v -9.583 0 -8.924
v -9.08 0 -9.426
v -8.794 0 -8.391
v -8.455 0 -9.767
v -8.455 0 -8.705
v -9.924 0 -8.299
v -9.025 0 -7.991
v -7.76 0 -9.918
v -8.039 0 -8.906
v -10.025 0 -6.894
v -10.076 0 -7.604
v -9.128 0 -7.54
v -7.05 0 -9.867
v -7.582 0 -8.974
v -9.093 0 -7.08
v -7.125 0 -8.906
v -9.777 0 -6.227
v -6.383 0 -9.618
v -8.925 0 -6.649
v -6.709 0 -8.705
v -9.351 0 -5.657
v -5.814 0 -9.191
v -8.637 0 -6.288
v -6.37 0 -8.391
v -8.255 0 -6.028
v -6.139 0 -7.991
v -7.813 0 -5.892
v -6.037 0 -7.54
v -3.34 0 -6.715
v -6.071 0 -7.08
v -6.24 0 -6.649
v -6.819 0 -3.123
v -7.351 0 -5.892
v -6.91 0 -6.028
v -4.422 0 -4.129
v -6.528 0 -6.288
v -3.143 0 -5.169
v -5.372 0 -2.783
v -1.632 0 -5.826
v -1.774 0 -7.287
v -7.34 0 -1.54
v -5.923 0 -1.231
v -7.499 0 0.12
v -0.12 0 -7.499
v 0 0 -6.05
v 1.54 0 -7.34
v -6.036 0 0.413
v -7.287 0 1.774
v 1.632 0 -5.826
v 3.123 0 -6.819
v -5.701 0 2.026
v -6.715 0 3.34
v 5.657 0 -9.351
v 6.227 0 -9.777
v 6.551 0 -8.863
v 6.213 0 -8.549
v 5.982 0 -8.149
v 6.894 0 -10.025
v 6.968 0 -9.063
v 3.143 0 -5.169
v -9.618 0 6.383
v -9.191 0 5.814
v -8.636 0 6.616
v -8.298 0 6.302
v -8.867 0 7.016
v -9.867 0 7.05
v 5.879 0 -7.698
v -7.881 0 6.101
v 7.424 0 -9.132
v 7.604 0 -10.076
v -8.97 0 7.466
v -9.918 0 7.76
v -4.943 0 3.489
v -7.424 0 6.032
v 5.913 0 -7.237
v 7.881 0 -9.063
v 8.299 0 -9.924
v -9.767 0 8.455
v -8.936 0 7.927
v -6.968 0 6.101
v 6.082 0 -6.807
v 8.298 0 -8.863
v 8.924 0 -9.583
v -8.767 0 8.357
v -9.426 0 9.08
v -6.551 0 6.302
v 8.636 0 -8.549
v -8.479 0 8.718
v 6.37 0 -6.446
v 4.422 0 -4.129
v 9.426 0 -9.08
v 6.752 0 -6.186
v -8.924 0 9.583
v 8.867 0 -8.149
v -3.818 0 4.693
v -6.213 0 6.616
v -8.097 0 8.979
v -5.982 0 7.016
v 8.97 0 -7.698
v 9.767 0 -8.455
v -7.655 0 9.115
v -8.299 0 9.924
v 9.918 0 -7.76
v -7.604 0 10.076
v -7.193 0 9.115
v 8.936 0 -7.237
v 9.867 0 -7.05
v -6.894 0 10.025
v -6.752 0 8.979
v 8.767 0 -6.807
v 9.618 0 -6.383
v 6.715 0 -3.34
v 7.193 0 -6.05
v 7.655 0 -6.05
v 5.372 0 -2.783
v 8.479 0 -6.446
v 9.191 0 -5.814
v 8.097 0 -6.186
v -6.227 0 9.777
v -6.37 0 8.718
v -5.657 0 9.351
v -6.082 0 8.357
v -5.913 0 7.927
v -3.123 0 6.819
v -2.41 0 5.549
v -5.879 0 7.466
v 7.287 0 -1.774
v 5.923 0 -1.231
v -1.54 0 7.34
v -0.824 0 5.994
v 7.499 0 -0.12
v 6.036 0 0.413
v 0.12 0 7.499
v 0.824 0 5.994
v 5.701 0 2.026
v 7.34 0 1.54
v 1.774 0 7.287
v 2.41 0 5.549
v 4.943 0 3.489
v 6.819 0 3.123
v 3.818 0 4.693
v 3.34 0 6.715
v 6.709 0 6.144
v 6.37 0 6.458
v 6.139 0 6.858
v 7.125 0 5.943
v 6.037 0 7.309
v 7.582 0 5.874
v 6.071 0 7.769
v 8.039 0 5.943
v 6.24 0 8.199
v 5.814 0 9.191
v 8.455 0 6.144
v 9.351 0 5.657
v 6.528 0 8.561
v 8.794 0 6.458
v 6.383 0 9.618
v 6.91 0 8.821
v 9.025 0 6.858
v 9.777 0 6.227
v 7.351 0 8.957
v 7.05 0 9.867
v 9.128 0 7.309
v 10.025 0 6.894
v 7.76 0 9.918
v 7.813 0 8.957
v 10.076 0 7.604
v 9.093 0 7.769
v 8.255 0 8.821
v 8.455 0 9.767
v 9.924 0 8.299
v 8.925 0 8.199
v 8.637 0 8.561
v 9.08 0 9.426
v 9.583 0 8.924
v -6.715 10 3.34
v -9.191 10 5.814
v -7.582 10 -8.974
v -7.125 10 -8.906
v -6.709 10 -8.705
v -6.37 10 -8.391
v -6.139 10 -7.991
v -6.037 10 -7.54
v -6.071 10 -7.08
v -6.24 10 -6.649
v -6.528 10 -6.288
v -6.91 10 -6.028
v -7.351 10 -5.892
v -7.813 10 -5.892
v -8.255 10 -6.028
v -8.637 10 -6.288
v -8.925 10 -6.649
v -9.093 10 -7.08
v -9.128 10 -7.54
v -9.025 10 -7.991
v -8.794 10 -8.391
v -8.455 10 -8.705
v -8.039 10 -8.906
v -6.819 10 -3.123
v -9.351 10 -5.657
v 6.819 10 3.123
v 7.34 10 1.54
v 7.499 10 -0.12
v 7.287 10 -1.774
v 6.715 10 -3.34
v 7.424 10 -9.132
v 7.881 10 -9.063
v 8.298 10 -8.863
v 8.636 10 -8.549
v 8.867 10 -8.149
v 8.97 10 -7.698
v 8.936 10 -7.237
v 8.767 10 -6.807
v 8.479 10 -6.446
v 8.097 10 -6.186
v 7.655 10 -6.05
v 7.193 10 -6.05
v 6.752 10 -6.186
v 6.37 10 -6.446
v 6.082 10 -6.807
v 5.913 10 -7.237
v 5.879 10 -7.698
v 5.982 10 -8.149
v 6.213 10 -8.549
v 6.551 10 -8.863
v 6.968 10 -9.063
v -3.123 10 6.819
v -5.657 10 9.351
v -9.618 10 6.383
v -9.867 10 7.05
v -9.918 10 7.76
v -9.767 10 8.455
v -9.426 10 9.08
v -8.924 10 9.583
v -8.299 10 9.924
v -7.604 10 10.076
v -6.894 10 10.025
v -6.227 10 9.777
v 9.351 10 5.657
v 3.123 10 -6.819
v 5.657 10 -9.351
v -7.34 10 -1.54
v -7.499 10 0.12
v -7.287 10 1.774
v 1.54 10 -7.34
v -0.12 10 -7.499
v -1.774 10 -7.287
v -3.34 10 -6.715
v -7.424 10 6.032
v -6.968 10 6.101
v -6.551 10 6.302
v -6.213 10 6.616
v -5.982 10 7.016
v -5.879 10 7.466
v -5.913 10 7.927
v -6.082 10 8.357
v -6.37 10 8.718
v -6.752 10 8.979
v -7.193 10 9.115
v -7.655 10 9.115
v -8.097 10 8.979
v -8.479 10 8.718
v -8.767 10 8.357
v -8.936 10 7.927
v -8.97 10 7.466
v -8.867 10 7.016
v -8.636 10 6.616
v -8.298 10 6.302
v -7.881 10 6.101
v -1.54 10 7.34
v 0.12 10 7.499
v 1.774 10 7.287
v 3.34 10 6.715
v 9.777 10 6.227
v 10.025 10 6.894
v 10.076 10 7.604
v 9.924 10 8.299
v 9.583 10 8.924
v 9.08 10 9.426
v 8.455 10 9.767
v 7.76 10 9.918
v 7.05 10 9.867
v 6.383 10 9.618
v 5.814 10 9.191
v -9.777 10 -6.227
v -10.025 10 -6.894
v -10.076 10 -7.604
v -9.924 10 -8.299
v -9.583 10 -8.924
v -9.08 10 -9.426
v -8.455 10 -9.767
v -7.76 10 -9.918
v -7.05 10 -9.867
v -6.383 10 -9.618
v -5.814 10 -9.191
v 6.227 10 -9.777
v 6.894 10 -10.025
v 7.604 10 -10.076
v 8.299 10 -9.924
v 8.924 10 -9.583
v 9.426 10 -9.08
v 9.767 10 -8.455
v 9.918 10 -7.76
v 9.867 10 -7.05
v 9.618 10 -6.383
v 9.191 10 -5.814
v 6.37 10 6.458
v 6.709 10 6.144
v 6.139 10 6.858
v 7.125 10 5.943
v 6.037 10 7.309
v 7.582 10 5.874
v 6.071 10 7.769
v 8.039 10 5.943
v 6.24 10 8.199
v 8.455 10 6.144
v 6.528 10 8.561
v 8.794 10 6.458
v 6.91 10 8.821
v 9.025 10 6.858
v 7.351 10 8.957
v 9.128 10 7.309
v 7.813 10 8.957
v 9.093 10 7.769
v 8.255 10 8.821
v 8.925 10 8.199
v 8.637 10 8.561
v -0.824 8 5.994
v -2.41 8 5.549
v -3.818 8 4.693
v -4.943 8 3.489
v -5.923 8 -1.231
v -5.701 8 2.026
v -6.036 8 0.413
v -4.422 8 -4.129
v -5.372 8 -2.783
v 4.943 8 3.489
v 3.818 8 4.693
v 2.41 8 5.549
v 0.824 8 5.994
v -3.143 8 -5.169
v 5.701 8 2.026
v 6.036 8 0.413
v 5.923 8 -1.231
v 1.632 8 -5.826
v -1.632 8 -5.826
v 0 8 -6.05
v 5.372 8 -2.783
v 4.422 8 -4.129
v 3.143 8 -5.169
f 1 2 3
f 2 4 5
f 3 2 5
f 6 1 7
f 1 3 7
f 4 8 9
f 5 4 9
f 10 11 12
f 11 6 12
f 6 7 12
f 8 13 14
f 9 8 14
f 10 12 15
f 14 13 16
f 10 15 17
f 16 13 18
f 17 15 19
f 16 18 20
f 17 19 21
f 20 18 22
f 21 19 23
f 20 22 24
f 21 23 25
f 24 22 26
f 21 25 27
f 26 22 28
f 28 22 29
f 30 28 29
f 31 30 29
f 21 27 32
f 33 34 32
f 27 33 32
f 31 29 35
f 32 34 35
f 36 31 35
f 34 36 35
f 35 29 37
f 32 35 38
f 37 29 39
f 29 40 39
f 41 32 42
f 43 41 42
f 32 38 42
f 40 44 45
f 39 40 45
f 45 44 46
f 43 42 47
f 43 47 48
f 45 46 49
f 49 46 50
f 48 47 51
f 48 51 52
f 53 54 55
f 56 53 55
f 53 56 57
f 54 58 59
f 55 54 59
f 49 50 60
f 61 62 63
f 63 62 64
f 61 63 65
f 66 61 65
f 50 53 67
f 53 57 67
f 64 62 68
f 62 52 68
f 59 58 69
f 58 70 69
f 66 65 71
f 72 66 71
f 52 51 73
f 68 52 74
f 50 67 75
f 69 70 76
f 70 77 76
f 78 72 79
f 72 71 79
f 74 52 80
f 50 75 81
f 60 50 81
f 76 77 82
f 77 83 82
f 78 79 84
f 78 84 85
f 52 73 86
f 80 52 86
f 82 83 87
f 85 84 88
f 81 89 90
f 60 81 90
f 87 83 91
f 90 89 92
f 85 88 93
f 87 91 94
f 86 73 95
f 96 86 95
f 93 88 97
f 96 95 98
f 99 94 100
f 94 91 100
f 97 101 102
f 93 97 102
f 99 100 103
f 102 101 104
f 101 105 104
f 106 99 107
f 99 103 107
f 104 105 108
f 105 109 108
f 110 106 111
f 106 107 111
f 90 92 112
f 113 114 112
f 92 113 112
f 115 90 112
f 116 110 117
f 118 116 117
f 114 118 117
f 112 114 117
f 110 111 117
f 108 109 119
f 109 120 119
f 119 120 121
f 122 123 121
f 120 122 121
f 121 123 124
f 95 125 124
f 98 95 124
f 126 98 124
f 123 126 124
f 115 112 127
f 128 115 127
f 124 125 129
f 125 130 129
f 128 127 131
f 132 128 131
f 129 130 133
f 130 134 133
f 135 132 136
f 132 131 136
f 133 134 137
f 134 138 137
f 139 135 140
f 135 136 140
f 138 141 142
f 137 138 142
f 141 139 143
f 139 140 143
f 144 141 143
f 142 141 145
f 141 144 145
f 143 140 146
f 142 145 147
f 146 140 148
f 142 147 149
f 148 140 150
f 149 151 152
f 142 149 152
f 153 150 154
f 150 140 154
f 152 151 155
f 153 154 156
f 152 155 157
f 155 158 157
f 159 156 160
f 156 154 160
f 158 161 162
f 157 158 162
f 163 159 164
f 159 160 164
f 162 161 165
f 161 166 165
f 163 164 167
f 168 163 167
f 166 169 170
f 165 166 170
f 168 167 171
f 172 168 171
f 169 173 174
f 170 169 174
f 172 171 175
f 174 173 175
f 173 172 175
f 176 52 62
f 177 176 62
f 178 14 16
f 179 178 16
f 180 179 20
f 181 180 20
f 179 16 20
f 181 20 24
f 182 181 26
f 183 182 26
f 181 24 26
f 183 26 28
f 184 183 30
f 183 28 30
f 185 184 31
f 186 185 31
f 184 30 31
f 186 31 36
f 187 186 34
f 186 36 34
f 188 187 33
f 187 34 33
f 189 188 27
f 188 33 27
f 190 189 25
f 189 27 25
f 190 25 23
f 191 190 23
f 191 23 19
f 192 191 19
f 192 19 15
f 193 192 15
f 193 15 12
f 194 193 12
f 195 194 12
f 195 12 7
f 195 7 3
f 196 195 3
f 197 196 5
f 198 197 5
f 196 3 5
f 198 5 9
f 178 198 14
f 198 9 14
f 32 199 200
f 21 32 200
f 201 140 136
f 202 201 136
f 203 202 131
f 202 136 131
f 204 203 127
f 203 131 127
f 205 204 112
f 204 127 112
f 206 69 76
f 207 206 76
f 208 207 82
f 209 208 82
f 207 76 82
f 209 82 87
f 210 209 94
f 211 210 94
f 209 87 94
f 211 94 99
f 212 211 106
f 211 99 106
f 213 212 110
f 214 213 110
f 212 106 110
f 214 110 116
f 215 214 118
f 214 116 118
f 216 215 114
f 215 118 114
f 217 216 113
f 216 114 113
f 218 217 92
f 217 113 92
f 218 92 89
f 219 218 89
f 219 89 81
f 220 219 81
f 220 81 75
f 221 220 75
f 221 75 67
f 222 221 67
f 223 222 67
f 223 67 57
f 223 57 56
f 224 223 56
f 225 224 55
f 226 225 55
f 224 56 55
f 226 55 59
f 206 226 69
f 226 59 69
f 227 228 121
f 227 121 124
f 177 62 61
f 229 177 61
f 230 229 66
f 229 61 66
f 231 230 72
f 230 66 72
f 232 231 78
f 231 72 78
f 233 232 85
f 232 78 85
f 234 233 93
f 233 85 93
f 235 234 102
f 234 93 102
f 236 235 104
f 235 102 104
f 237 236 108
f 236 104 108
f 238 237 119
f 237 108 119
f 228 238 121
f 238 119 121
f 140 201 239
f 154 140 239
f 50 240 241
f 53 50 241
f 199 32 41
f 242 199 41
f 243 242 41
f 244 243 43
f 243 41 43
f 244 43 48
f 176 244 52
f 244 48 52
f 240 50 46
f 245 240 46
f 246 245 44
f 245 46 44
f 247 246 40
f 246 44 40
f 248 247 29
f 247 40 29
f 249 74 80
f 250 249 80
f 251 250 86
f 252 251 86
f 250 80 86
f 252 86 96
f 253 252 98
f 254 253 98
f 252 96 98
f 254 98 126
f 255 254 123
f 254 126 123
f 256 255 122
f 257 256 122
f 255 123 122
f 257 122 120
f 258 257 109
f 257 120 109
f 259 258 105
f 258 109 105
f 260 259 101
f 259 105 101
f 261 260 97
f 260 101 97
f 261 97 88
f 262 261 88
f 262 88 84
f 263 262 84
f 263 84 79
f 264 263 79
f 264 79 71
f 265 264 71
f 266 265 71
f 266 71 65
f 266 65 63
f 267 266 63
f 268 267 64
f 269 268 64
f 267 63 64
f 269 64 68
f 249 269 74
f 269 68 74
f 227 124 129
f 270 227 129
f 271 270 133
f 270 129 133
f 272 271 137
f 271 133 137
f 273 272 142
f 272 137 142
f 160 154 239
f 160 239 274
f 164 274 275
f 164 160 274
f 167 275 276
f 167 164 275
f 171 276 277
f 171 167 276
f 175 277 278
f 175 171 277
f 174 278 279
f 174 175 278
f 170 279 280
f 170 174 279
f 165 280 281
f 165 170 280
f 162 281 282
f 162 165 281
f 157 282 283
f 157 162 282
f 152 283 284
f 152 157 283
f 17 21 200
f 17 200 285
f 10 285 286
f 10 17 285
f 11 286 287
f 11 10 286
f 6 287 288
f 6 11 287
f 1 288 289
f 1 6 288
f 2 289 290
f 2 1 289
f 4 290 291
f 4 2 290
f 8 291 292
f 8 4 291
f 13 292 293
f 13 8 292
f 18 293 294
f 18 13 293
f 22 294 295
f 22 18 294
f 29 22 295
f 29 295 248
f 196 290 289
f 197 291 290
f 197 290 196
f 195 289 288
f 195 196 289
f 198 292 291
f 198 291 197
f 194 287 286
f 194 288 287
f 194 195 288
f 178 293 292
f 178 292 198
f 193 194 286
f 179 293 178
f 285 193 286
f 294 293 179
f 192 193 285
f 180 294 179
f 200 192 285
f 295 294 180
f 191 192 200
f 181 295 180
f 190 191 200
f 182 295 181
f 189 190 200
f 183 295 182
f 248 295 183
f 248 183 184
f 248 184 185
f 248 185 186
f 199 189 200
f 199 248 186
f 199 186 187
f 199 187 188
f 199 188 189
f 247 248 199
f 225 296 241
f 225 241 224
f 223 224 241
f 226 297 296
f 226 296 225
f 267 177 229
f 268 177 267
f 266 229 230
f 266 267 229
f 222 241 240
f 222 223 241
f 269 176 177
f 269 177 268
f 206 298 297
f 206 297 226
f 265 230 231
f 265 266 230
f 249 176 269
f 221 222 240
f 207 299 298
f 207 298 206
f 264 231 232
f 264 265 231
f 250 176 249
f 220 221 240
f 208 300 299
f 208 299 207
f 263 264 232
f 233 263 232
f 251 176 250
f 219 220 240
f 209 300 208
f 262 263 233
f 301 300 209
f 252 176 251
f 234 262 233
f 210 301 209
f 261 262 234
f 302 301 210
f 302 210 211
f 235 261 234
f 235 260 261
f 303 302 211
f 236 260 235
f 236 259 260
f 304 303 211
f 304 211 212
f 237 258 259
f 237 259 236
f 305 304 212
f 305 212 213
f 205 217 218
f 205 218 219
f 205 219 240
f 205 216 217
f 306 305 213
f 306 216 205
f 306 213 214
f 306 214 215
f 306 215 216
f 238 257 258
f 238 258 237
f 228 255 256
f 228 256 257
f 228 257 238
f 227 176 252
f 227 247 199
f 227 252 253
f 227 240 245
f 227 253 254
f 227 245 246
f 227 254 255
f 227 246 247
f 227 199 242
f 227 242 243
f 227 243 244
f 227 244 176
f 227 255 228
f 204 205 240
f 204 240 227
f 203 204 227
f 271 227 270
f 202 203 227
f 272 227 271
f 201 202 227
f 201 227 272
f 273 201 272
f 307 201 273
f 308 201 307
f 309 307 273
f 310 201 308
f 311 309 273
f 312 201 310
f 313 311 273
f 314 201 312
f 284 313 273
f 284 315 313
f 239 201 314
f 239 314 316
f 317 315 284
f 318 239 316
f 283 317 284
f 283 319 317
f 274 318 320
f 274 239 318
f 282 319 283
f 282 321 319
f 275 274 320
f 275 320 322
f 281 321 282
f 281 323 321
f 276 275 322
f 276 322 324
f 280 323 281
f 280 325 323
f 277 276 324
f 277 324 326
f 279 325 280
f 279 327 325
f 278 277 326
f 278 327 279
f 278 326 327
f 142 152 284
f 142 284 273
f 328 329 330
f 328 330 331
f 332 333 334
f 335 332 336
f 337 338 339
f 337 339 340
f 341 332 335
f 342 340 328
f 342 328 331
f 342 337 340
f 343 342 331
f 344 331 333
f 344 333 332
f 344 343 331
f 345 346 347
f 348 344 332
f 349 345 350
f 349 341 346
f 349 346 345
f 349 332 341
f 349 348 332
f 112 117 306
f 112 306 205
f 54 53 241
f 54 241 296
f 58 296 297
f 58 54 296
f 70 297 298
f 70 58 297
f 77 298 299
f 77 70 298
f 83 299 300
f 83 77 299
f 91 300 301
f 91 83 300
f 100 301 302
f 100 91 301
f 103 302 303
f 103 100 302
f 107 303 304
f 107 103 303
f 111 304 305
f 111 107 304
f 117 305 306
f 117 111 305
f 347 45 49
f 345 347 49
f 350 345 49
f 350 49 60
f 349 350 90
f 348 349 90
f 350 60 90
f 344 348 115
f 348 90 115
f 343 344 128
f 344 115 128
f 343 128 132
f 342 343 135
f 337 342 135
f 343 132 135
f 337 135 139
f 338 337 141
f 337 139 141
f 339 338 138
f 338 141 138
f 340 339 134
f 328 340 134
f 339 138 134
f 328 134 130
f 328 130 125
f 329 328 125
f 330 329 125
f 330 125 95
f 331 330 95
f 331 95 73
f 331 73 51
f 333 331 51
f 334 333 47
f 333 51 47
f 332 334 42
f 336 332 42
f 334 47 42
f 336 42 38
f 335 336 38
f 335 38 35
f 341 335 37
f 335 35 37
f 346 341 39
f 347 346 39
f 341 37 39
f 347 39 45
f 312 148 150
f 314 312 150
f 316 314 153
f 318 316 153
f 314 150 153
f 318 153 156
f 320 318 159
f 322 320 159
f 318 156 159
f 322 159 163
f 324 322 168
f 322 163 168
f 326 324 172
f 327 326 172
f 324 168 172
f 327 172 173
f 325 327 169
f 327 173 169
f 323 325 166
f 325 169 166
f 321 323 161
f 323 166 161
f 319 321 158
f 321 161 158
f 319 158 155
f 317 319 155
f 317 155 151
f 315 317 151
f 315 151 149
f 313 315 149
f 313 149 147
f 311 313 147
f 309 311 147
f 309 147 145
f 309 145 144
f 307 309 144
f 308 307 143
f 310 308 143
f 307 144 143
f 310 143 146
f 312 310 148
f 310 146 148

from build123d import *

# Parameters (mm, degrees)
SKETCH1_R           = 7.5
BOSS_EXTRUDE1_DEPTH = 10
SKETCH3_R           = 1.55
BOSS_EXTRUDE2_DEPTH = 10
SKETCH4_R           = 6.05
CUT_EXTRUDE2_DEPTH  = 8


with BuildPart() as part:
    # Sketch1 → Boss-Extrude1 (new body)
    with BuildSketch(Plane(origin=(0, 0, 0), x_dir=(1, 0, 0), z_dir=(0, 1, 0))):
        with Locations(Location((0, 0, 0), (0, 0, 270))):
            Circle(SKETCH1_R)
    extrude(amount=BOSS_EXTRUDE1_DEPTH)

    # Sketch3 → Boss-Extrude2 (add)
    # profile 1 of 4: a face of its own
    with BuildSketch(Plane.XZ):
        with BuildLine():
            Line((-5.657484018, 9.350809391), (-3.123198857, 6.818770336))
            ThreePointArc((-3.123198857, 6.818770336), (-5.217761179, 5.387482554), (-6.715339638, 3.339792441))
            Line((-6.715339638, 3.339792441), (-9.191450131, 5.813708387))
            ThreePointArc((-9.191450131, 5.813708387), (-9.193017577, 9.349241945), (-5.657484018, 9.350809391))
        make_face()
        with Locations(Location((-7.424467075, 7.582258889, 0), (0, 0, 270))):
            Circle(SKETCH3_R, mode=Mode.SUBTRACT)
    # profile 2 of 4: a face of its own
    with BuildSketch(Plane.XZ):
        with BuildLine():
            Line((5.813708387, 9.191450131), (3.339792441, 6.715339638))
            ThreePointArc((3.339792441, 6.715339638), (5.387482554, 5.217761179), (6.818770336, 3.123198857))
            Line((6.818770336, 3.123198857), (9.350809391, 5.657484018))
            ThreePointArc((9.350809391, 5.657484018), (9.349241945, 9.193017577), (5.813708387, 9.191450131))
        make_face()
        with Locations(Location((7.582258889, 7.424467075, 0), (0, 0, 270))):
            Circle(SKETCH3_R, mode=Mode.SUBTRACT)
    # profile 3 of 4: a face of its own
    with BuildSketch(Plane.XZ):
        with BuildLine():
            Line((9.191450131, -5.813708387), (6.715339638, -3.339792441))
            ThreePointArc((6.715339638, -3.339792441), (5.217761179, -5.387482554), (3.123198857, -6.818770336))
            Line((3.123198857, -6.818770336), (5.657484018, -9.350809391))
            ThreePointArc((5.657484018, -9.350809391), (9.193017577, -9.349241945), (9.191450131, -5.813708387))
        make_face()
        with Locations(Location((7.424467075, -7.582258889, 0), (0, 0, 270))):
            Circle(SKETCH3_R, mode=Mode.SUBTRACT)
    # profile 4 of 4: a face of its own
    with BuildSketch(Plane.XZ):
        with BuildLine():
            Line((-5.813708387, -9.191450131), (-3.339792441, -6.715339638))
            ThreePointArc((-3.339792441, -6.715339638), (-5.387482554, -5.217761179), (-6.818770336, -3.123198857))
            Line((-6.818770336, -3.123198857), (-9.350809391, -5.657484018))
            ThreePointArc((-9.350809391, -5.657484018), (-9.349241945, -9.193017577), (-5.813708387, -9.191450131))
        make_face()
        with Locations(Location((-7.582258889, -7.424467075, 0), (0, 0, 270))):
            Circle(SKETCH3_R, mode=Mode.SUBTRACT)
    extrude(amount=-BOSS_EXTRUDE2_DEPTH)

    # Sketch4 → Cut-Extrude2 (cut)
    with BuildSketch(Plane.XZ):
        with Locations(Location((0, 0, 0), (0, 0, 270))):
            Circle(SKETCH4_R)
    extrude(amount=-CUT_EXTRUDE2_DEPTH, mode=Mode.SUBTRACT)


solid = part.part
